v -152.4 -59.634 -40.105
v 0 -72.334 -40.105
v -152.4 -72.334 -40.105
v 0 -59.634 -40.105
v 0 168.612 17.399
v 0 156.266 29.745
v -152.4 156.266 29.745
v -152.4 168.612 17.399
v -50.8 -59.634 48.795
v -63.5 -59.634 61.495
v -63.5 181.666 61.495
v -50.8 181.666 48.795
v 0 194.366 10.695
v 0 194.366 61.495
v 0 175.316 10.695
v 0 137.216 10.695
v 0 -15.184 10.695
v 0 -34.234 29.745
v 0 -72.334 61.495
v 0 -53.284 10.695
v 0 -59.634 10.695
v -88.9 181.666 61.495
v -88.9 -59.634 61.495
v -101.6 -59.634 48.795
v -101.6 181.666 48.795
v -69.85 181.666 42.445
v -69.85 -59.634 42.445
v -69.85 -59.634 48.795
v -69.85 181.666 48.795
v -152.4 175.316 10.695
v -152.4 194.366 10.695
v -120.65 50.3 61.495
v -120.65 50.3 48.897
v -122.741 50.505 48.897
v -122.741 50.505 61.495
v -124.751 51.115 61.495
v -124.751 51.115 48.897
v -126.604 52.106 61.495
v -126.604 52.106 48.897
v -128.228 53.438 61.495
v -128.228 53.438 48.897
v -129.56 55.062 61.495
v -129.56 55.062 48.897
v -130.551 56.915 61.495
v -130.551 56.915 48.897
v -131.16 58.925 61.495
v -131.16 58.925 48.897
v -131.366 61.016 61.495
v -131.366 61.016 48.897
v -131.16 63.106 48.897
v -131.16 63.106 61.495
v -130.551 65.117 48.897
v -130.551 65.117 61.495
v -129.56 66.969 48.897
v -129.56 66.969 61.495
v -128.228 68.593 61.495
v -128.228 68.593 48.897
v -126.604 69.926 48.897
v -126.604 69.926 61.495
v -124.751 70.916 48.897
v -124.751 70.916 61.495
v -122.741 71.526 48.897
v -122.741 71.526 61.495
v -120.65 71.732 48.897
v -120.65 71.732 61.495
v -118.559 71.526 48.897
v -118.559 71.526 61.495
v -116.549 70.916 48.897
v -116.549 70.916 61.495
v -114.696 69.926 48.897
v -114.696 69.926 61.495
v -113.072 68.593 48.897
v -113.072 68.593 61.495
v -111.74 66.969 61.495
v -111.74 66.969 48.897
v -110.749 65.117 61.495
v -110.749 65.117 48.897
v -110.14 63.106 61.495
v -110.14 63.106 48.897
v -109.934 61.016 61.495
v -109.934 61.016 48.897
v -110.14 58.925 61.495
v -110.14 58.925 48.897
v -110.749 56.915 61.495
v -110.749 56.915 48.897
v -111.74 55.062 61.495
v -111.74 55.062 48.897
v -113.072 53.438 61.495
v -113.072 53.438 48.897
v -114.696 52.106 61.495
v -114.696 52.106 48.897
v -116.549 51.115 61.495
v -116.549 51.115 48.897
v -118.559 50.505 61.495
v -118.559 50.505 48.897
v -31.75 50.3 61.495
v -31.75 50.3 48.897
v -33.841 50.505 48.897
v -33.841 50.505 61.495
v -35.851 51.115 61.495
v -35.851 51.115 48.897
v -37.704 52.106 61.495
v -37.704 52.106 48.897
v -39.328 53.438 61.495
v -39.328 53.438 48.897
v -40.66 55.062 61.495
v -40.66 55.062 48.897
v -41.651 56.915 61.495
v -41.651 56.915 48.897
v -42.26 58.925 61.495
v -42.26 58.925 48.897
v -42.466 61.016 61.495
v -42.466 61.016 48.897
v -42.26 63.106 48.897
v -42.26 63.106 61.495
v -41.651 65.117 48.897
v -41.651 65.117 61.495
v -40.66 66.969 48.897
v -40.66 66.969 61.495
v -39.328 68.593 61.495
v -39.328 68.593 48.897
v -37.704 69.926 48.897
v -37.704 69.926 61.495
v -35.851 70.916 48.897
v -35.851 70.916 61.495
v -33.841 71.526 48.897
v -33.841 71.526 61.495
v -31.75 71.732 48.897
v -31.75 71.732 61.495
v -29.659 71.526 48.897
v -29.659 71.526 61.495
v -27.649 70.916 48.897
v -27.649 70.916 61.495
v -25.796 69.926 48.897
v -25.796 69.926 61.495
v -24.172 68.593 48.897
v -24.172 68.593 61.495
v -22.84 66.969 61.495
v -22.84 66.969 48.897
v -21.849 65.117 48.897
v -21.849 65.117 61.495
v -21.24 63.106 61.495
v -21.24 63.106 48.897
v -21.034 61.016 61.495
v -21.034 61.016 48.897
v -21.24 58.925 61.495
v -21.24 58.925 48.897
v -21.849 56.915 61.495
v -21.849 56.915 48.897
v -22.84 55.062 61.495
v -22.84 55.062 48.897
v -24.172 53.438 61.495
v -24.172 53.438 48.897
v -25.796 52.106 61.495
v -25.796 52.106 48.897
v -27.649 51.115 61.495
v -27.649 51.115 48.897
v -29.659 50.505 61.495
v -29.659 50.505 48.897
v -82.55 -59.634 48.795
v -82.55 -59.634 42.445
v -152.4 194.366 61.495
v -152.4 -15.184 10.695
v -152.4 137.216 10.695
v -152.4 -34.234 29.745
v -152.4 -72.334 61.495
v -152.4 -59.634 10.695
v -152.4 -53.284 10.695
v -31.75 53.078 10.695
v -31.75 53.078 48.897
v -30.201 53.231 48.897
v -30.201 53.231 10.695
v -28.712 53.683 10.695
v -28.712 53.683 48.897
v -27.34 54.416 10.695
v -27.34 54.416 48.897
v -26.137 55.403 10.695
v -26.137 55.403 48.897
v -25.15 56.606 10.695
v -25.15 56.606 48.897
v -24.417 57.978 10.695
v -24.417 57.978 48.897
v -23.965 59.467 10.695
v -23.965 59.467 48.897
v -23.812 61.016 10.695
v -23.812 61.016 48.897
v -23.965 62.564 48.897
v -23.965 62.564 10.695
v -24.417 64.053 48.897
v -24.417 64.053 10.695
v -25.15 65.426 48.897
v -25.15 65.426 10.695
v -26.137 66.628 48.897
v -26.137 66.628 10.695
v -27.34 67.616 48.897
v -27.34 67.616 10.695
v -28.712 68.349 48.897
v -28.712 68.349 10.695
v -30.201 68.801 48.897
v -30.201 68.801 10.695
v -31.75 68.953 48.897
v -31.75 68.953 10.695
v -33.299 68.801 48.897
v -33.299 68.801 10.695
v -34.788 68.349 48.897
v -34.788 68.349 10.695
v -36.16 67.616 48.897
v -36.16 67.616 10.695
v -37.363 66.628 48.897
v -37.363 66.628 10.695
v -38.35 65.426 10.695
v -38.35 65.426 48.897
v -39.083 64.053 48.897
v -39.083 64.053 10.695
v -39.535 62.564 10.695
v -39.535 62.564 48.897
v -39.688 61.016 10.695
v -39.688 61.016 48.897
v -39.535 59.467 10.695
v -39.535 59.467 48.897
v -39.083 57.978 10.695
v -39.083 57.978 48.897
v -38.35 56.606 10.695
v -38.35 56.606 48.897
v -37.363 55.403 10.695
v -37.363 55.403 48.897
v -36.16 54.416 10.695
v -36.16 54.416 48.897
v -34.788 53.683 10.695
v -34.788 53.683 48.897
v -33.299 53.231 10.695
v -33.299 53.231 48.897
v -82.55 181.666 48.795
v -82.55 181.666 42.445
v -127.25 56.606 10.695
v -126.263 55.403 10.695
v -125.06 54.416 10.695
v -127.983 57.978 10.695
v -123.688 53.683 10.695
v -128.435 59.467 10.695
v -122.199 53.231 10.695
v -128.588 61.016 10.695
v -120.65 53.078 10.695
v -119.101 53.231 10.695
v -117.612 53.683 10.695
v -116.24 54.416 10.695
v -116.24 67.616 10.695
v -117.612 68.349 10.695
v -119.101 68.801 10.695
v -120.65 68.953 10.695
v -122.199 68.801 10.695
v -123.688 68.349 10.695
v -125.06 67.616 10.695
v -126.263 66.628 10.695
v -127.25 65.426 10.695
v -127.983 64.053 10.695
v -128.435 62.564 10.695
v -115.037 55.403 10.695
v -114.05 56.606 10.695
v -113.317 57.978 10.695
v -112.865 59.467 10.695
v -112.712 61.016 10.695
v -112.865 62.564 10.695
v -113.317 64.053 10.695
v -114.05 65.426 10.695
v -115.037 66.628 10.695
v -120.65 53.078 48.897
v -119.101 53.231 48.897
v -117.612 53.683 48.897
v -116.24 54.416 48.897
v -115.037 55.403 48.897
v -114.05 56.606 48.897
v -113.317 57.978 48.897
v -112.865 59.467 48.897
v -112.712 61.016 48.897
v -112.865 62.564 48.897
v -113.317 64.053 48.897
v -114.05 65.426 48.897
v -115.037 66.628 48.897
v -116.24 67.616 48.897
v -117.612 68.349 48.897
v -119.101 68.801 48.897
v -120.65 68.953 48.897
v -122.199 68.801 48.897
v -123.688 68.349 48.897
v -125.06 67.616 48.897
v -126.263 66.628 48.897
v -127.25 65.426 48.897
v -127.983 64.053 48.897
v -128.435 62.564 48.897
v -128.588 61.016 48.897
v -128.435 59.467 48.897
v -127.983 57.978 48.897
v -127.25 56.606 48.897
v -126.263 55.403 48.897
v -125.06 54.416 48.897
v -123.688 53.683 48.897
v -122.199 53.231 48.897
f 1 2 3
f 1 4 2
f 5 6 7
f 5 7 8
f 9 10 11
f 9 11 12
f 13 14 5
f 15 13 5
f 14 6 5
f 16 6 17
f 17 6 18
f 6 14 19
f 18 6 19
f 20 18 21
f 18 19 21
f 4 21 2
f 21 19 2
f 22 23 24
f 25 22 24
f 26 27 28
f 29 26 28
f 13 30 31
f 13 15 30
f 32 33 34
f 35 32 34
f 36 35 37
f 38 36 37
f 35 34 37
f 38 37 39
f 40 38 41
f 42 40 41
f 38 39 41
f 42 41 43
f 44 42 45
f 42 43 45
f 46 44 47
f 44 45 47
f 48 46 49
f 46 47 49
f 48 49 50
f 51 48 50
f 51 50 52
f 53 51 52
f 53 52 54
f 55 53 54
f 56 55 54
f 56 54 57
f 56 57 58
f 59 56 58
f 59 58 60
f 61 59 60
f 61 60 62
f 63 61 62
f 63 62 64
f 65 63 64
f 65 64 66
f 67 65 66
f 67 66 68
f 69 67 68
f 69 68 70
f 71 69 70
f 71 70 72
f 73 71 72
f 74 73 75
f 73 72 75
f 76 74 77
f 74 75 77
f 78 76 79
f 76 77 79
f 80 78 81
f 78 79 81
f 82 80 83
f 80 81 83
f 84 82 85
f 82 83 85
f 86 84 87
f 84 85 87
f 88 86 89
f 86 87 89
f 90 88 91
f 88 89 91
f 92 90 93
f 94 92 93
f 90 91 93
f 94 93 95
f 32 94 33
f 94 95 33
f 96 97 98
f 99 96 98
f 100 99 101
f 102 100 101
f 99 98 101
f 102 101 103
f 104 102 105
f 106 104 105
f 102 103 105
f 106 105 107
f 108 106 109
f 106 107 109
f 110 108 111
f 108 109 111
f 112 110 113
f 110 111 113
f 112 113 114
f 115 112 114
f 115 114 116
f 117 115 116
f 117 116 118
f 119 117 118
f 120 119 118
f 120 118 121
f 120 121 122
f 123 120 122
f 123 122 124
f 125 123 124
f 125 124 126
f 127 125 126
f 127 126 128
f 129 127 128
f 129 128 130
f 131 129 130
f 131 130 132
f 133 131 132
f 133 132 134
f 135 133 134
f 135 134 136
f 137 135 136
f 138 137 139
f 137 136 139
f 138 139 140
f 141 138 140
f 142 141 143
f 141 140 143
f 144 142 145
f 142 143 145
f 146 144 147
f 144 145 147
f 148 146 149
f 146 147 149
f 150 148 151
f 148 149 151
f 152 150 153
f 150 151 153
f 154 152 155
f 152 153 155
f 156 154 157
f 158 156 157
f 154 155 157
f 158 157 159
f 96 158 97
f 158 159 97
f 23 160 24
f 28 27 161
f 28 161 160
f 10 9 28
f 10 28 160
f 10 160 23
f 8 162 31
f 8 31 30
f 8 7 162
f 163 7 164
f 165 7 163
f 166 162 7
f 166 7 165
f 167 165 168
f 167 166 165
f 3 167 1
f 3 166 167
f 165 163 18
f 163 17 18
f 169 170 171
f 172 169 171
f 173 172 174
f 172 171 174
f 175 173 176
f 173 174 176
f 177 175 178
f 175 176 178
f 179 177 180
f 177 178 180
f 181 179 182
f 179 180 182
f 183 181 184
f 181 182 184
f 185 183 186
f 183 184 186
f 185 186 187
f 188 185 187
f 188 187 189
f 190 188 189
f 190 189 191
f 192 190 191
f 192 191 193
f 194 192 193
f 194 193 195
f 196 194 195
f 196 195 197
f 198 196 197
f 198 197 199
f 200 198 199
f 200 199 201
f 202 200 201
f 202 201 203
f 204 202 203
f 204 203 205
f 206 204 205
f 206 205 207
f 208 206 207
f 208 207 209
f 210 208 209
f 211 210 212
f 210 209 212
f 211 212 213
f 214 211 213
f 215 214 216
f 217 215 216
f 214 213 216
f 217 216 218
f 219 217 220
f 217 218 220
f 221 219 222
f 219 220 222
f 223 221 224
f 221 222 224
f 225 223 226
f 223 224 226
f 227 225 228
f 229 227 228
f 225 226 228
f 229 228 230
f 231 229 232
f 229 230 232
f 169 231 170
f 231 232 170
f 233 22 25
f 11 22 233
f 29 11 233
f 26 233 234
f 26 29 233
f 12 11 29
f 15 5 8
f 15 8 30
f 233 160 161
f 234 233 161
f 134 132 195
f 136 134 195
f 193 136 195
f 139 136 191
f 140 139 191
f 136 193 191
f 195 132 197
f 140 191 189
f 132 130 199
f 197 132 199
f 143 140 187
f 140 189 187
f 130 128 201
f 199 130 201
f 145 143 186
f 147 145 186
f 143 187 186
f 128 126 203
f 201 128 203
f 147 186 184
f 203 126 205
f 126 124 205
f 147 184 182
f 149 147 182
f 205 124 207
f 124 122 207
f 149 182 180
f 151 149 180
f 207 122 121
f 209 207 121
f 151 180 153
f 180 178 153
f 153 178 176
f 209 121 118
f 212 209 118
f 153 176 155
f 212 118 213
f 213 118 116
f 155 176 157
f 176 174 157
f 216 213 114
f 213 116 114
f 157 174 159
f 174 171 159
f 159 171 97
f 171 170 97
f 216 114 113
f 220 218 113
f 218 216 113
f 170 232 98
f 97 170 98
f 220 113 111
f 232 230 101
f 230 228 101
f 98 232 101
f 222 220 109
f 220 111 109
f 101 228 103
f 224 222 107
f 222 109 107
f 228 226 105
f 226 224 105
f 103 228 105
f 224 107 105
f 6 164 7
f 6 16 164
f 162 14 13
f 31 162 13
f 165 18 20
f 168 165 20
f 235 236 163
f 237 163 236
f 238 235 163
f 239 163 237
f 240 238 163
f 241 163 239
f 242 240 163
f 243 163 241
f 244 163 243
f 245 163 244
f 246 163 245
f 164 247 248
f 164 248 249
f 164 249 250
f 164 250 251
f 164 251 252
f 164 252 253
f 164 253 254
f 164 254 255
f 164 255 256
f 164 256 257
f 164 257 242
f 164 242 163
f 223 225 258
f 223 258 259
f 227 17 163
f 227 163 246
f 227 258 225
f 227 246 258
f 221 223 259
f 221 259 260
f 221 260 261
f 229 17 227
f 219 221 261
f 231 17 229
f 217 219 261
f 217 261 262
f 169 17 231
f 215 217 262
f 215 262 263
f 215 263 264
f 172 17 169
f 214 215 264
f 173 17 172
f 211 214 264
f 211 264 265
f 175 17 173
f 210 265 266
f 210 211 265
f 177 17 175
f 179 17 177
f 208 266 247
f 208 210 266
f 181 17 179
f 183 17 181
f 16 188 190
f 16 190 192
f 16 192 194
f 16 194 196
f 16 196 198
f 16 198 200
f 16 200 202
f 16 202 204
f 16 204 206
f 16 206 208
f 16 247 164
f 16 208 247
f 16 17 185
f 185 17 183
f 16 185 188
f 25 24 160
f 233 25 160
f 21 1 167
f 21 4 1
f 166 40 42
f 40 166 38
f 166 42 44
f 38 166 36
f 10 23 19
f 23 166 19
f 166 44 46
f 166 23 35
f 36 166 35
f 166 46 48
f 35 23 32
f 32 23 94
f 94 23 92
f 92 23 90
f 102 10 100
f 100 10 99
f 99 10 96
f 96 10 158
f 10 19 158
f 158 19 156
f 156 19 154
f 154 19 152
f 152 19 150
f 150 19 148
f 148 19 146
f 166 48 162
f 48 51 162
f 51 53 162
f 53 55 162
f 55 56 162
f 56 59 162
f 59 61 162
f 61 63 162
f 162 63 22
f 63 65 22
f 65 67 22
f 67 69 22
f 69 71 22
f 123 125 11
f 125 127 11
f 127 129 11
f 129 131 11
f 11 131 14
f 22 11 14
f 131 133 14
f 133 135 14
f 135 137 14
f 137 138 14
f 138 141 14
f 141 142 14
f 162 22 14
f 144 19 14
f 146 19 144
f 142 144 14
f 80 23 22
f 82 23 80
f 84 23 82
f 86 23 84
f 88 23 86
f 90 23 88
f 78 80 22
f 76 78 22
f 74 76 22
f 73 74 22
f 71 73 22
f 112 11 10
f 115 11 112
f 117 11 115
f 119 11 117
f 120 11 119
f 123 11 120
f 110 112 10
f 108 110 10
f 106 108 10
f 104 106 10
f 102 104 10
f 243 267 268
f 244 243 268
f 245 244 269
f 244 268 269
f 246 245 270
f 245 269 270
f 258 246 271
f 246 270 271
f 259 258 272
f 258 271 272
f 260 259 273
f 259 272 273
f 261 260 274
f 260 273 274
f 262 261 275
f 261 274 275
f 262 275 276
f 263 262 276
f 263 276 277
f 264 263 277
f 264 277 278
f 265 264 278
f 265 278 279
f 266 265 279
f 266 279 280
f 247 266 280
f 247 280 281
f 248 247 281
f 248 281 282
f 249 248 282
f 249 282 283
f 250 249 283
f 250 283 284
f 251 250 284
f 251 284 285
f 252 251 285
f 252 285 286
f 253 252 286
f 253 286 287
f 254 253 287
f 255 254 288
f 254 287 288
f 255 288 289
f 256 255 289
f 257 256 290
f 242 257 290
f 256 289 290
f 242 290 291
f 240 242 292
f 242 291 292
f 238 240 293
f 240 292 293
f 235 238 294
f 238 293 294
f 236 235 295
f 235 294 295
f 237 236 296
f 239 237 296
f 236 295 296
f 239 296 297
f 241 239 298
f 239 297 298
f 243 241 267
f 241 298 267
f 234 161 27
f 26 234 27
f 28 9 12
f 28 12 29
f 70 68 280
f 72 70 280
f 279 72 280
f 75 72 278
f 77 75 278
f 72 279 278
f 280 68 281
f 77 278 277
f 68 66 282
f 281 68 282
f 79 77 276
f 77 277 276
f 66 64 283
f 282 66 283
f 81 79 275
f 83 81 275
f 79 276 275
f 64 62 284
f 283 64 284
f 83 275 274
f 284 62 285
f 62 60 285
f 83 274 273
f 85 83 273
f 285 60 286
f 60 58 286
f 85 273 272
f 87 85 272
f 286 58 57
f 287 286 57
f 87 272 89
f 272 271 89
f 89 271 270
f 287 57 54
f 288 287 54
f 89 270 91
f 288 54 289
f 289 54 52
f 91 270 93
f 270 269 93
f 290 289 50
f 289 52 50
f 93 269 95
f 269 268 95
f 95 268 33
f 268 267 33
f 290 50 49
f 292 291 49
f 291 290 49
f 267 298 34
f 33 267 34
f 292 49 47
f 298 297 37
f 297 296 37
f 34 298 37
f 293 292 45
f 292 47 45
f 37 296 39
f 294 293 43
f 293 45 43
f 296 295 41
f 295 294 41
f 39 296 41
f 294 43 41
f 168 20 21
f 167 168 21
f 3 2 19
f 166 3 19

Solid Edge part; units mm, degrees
sketch "Sketch1" plane through (0, 0, 0) normal (1, 0, 0) x (0, 1, 0)
  line L0 (-59.6342, 10.695) -> (-59.6342, 48.795)
  line L1 (-59.6342, 48.795) -> (-59.6342, 61.495)
  line L2 (-59.6342, 61.495) -> (181.6658, 61.495)
  line L3 (181.6658, 61.495) -> (181.6658, 48.795)
  line L4 (181.6658, 10.695) -> (181.6658, 48.795)
  line L5 (175.3158, 10.695) -> (181.6658, 10.695)
  line L6 (168.6119, 17.3988) -> (175.3158, 10.695)
  line L7 (156.2658, 29.745) -> (168.6119, 17.3988)
  line L8 (137.2158, 10.695) -> (156.2658, 29.745)
  line L9 (-15.1842, 10.695) -> (137.2158, 10.695)
  line L10 (-15.1842, 10.695) -> (-34.2342, 29.745)
  line L11 (-34.2342, 29.745) -> (-53.2842, 10.695)
  line L12 (-53.2842, 10.695) -> (-59.6342, 10.695)
extrude "Protrusion1" add sketch "Sketch1" against normal blind 152.4
sketch "Sketch2" plane through (-76.2, -59.6342, 36.095) normal (0, -1, 0) x (1, 0, 0)
  line L0 (12.7, 25.4) -> (25.4, 12.7)
  line L1 (25.4, 12.7) -> (12.7, 12.7)
  line L2 (6.35, 12.7) -> (12.7, 12.7)
  line L3 (6.35, 6.35) -> (6.35, 12.7)
  line L4 (-6.35, 6.35) -> (6.35, 6.35)
  line L5 (-6.35, 12.7) -> (-6.35, 6.35)
  line L6 (-12.7, 12.7) -> (-6.35, 12.7)
  line L7 (-25.4, 12.7) -> (-12.7, 12.7)
  line L8 (-12.7, 25.4) -> (-25.4, 12.7)
  line L9 (-76.2, 25.4) -> (-12.7, 25.4)
extrude "Cutout1" cut sketch "Sketch2" against normal through all material side at (-57.1854, -59.6342, 55.1096)
sketch "Sketch3" plane through (-76.2, -59.6342, 36.095) normal (0, -1, 0) x (1, 0, 0)
  line L0 (76.2, -76.2) -> (-76.2, -76.2)
  line L1 (-76.2, -76.2) -> (-76.2, 25.4)
  line L2 (-76.2, 25.4) -> (76.2, 25.4)
  line L3 (76.2, 25.4) -> (76.2, -76.2)
extrude "ExtrudedProtrusion_2" add sketch "Sketch3" along normal blind 12.7
sketch "Sketch4" plane through (-76.2, 181.6658, 36.095) normal (0, 1, 0) x (-1, 0, 0)
  line L0 (-76.2, 25.4) -> (76.2, 25.4)
  line L1 (76.2, 25.4) -> (76.2, -25.4)
  line L2 (76.2, -25.4) -> (-76.2, -25.4)
  line L3 (-76.2, -25.4) -> (-76.2, 25.4)
extrude "ExtrudedProtrusion_3" add sketch "Sketch4" along normal blind 12.7
hole "Hole_1" at (-120.65, 61.0158, 61.495) direction (0, 0, -1) diameter 15.875 end up to next counterbore diameter 21.4325 counterbore depth 12.5984
hole "Hole1" at (-31.75, 61.0158, 61.495) direction (0, 0, -1) diameter 15.875 end up to next counterbore diameter 21.4325 counterbore depth 12.5984
